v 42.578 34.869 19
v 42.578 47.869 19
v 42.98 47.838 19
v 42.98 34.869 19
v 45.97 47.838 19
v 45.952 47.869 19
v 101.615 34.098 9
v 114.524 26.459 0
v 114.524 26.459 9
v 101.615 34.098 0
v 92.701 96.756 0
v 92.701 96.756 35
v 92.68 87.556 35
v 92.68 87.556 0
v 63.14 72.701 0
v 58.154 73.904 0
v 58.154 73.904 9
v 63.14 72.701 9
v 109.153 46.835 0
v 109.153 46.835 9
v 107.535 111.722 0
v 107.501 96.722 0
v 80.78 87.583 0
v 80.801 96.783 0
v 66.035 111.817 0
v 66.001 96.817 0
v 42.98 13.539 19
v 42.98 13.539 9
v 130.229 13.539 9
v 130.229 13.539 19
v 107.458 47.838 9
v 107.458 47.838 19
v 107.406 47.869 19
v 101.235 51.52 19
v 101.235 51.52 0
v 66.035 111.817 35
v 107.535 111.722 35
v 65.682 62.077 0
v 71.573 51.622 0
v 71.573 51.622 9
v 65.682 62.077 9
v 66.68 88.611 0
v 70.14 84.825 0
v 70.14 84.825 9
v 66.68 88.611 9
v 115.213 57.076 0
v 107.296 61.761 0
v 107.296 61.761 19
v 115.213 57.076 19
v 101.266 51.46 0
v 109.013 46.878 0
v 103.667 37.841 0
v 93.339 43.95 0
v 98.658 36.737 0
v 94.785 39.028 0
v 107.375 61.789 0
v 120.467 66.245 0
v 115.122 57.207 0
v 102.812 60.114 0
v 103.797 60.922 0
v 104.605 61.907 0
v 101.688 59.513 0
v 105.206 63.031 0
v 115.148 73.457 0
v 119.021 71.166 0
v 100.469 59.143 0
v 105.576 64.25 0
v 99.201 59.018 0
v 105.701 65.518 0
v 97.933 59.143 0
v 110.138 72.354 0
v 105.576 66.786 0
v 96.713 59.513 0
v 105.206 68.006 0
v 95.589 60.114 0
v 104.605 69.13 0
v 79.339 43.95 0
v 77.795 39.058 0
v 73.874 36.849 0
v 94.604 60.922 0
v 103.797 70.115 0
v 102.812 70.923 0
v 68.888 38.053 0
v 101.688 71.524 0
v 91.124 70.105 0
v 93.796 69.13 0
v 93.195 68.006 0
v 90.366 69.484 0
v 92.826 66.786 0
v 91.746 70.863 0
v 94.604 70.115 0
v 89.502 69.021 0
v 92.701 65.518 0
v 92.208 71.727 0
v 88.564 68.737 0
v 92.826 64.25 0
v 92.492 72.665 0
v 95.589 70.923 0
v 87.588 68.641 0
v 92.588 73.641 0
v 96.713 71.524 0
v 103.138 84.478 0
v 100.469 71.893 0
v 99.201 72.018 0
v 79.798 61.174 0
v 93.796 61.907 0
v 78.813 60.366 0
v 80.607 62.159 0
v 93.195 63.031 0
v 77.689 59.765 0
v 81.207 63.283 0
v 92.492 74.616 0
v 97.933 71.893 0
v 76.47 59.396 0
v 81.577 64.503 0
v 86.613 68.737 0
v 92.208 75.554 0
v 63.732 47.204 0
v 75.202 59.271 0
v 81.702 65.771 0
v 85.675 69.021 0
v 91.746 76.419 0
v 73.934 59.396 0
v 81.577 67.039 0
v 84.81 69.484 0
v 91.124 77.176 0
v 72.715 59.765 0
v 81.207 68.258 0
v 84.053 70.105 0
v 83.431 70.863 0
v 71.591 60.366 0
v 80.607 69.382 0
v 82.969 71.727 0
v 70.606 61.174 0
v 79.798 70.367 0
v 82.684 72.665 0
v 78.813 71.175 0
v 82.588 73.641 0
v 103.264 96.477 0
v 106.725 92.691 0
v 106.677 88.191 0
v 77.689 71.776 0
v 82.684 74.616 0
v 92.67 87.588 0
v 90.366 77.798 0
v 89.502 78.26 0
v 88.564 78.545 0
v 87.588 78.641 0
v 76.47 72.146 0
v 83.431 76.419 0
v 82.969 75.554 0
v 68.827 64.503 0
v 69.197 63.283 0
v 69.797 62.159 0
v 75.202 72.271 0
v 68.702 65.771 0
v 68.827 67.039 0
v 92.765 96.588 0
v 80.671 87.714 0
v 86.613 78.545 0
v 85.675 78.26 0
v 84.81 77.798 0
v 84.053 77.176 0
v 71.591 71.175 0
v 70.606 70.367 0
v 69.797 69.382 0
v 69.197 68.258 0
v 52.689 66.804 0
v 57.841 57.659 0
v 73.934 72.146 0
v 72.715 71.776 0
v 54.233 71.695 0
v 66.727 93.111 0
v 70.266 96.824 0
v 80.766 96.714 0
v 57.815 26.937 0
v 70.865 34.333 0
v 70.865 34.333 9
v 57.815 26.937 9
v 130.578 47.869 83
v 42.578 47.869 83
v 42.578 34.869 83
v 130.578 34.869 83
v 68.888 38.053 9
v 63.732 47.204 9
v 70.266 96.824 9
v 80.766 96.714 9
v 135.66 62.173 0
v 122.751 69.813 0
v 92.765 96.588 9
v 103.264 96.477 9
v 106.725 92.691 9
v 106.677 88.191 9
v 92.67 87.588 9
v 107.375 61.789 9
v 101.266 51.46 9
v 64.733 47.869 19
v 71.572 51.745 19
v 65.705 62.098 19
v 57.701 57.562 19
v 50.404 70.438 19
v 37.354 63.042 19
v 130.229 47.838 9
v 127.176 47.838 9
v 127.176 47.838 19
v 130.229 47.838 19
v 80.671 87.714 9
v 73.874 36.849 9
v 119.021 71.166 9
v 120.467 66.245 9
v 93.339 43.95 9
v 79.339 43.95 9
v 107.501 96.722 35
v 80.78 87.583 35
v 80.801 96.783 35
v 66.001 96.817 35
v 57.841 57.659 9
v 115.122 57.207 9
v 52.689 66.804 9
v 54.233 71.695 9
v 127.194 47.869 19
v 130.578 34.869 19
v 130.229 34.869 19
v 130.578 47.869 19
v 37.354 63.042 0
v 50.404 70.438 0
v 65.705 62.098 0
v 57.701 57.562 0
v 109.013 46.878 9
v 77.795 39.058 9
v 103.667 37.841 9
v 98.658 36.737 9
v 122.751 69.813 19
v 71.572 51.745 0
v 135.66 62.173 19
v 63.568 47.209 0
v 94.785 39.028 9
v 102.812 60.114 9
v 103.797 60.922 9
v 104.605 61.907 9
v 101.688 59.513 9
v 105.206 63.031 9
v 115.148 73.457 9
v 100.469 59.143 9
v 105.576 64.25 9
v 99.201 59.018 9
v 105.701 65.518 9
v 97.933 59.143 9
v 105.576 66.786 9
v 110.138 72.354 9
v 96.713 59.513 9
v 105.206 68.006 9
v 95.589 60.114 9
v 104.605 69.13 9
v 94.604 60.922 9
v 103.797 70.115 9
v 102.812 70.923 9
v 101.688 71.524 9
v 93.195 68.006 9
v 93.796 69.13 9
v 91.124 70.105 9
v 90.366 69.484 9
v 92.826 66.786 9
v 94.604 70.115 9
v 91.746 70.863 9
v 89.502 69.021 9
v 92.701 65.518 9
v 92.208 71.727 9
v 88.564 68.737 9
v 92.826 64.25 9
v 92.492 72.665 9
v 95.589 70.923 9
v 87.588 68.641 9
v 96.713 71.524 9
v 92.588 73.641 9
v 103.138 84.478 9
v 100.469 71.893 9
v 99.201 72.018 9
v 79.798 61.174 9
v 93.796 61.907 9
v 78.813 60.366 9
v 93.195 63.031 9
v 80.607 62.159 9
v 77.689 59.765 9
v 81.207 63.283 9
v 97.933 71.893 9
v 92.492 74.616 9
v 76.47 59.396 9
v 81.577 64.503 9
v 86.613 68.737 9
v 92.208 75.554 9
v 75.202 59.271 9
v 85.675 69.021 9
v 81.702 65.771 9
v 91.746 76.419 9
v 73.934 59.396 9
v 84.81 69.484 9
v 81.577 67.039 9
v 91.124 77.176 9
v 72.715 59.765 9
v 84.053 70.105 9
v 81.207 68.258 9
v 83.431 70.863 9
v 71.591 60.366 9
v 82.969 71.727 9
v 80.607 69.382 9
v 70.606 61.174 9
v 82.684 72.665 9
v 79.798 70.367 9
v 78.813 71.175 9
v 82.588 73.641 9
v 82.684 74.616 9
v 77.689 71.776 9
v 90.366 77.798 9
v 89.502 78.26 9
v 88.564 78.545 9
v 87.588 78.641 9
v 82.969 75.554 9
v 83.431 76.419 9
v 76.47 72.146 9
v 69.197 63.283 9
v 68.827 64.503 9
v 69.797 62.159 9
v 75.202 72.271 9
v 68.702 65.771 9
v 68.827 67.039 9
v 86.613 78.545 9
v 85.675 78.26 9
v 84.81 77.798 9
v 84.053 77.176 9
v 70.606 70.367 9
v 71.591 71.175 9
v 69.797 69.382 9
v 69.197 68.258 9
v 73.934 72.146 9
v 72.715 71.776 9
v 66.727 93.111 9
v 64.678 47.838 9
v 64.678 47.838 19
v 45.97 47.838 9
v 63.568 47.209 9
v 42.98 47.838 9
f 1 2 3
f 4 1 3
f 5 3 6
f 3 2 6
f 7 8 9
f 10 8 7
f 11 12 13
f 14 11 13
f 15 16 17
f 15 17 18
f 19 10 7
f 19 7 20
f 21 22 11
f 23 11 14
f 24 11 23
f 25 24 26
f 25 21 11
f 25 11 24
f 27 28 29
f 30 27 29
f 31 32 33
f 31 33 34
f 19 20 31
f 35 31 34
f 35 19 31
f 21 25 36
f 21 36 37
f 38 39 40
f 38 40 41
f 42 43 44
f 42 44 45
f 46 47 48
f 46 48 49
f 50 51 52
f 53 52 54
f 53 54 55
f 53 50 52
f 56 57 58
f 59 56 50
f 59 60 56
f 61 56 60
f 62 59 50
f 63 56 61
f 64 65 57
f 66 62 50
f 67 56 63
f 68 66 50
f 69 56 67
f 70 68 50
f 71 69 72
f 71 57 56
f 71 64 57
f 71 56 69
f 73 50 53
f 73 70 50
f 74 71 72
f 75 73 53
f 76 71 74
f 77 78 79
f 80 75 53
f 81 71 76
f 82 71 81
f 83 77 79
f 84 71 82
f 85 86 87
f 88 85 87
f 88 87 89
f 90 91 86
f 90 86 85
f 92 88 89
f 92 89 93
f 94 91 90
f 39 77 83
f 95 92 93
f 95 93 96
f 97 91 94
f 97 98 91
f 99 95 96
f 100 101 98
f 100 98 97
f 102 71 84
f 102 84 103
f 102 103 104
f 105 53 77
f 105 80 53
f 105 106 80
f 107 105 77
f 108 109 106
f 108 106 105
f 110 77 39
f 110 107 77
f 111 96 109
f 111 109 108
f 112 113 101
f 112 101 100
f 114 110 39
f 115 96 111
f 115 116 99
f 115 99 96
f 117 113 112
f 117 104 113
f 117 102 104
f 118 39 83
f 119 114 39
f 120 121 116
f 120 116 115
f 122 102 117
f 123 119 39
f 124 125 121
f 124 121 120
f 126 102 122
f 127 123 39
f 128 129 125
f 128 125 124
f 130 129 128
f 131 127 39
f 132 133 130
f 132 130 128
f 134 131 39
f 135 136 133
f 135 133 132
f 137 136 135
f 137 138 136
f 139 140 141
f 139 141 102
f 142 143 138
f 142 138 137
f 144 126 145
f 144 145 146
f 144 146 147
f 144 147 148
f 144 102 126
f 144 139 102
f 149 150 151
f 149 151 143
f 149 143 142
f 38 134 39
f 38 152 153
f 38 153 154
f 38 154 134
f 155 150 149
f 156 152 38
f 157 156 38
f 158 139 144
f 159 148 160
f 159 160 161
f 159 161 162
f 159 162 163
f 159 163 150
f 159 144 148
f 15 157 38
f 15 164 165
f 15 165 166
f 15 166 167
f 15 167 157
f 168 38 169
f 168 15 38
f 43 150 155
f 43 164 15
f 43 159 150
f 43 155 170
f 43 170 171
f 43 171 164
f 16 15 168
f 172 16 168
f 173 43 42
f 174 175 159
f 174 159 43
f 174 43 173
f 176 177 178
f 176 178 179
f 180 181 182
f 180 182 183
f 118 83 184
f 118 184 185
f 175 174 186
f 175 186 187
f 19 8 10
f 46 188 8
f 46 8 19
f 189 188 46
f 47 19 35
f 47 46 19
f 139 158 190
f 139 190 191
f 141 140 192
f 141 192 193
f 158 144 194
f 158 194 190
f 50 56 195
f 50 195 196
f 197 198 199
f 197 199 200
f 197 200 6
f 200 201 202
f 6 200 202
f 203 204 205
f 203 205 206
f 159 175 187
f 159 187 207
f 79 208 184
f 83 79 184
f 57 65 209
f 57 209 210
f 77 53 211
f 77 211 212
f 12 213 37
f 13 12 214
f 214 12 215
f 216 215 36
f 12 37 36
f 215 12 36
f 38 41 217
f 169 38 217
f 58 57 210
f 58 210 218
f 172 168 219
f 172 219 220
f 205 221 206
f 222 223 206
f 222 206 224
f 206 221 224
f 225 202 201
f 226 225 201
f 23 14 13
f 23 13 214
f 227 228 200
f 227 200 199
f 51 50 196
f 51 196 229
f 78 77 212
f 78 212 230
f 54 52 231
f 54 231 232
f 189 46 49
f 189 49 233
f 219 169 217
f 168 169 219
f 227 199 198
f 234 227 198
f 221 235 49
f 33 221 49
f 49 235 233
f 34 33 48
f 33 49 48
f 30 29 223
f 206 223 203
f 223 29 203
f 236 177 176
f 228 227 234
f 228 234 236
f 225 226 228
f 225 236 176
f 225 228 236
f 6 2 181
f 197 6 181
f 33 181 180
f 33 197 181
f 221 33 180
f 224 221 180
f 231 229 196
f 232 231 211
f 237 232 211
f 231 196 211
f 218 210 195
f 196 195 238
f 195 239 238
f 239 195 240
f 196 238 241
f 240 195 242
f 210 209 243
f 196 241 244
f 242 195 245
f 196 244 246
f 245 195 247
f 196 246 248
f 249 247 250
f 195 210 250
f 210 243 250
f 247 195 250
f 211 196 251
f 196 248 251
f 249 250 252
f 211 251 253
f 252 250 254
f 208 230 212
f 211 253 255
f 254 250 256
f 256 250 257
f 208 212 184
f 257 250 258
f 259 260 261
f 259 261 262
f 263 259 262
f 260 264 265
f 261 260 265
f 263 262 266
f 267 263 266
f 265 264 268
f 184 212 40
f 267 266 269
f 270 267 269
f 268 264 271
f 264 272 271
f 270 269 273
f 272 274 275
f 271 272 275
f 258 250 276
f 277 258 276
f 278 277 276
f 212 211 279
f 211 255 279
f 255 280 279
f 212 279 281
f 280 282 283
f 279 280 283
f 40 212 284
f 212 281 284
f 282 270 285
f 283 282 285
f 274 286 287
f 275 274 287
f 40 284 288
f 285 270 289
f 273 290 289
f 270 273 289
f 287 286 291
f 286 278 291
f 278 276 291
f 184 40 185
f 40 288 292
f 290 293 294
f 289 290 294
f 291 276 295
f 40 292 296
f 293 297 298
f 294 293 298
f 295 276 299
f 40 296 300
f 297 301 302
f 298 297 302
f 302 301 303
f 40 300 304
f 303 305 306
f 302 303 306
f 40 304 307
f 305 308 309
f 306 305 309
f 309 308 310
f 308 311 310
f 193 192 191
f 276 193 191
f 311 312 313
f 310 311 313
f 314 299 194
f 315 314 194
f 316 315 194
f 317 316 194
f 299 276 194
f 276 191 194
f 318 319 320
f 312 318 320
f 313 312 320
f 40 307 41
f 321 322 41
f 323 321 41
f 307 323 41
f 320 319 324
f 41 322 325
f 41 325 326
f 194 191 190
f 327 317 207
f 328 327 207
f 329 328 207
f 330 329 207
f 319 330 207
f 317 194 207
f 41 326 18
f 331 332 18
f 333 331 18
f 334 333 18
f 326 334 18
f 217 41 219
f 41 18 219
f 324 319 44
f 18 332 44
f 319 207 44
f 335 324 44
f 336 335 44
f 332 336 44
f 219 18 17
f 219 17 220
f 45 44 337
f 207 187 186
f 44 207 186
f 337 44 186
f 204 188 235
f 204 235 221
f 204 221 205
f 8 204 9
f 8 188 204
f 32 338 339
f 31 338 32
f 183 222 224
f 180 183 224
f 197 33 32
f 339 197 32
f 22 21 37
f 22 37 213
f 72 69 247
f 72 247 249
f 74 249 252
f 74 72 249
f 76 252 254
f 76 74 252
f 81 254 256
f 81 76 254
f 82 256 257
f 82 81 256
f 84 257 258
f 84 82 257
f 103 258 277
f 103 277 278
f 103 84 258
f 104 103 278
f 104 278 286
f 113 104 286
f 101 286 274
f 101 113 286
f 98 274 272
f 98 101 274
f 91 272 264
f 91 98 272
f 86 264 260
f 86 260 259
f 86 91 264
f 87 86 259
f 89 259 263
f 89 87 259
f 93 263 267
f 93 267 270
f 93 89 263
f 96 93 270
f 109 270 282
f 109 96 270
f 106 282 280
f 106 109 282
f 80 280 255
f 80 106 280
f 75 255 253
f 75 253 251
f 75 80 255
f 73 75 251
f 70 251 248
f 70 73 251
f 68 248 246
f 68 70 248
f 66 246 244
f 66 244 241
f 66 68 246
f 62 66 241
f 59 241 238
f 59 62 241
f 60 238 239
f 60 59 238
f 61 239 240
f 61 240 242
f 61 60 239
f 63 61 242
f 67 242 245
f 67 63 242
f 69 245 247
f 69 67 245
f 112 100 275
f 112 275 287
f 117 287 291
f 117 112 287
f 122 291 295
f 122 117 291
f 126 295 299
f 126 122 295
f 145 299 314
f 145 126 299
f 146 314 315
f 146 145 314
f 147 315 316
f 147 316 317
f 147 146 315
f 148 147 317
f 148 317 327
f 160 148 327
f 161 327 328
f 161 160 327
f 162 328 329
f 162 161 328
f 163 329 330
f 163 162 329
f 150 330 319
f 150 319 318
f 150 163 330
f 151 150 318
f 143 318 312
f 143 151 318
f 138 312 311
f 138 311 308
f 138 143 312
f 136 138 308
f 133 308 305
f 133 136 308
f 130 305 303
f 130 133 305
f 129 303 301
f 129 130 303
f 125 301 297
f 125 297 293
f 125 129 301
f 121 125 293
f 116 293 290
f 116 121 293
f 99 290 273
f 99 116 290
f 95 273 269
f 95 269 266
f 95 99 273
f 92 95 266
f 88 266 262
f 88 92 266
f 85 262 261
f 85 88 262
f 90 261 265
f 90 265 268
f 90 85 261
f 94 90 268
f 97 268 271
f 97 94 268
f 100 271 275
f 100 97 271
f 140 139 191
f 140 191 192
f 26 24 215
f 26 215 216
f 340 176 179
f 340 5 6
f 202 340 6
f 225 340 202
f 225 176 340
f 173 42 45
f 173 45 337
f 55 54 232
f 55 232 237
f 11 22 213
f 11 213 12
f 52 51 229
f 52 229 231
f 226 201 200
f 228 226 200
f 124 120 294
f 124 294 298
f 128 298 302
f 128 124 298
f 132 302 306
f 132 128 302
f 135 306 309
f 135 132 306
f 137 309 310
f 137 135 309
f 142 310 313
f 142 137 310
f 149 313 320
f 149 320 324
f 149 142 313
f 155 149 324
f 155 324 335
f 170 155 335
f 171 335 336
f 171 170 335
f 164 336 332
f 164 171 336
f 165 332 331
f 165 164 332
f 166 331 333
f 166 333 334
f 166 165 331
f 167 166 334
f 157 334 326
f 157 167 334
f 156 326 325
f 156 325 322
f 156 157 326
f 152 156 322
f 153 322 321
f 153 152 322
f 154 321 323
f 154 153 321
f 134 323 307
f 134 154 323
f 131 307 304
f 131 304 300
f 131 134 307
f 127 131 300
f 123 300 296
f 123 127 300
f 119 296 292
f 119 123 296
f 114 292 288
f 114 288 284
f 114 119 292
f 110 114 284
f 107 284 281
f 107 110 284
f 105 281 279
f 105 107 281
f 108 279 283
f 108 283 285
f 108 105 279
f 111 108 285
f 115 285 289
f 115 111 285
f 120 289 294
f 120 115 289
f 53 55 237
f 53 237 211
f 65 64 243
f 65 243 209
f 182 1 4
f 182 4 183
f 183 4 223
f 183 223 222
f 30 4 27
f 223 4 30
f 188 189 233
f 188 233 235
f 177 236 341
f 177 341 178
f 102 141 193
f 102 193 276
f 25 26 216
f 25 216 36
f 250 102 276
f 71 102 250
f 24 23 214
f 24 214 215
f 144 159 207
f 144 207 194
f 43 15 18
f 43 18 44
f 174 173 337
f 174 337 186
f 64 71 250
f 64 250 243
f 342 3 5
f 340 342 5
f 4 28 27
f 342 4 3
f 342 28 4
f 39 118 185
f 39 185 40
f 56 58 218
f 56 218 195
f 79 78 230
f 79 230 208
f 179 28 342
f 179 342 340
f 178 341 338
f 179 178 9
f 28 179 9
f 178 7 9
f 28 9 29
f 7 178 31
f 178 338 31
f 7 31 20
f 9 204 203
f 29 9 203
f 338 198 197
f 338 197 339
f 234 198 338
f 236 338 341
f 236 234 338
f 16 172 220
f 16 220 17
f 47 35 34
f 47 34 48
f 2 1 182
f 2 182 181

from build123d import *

# Parameters (mm, degrees)
SKETCH001_R      = 5
SKETCH001_R_2    = 6.5
EXTRUDE_DEPTH    = 9
SKETCH004_W      = 87.248978
SKETCH004_H      = 34.299007
EXTRUDE004_DEPTH = 10
EXTRUDE002_DEPTH = 19
EXTRUDE001_DEPTH = 19
EXTRUDE003_DEPTH = 35
SKETCH005_W      = 88
SKETCH005_H      = 13
EXTRUDE005_DEPTH = 64


with BuildPart() as extrude_body:
    # Sketch001 → Extrude (new body)
    with BuildSketch(Plane(origin=(11, 13, 0), x_dir=(1, 0, 0), z_dir=(0, 0, 1))):
        Polygon((92.138212, 71.477997), (99.138212, 59.353641), (104.147683, 60.457133), (108.020931, 58.166292), (109.466872, 53.244732), (104.121576, 44.207154), (96.375081, 48.788836), (90.266171, 38.460176), (98.012666, 33.878494), (92.66737, 24.840916), (87.657898, 23.737425), (83.784651, 26.028266), (82.33871, 30.949826), (68.33871, 30.949826), (66.794519, 26.058201), (62.873968, 23.849291), (57.887594, 25.052863), (52.731628, 34.204082), (60.572729, 38.621903), (54.682302, 49.076704), (46.841201, 44.658884), (41.688919, 53.803566), (43.23311, 58.695191), (47.15366, 60.904101), (52.140035, 59.700529), (59.140035, 71.824885), (55.679647, 75.611469), (55.72695, 80.11122), (59.266176, 83.824222), (69.765596, 83.713849), (69.67099, 74.714346), (81.670327, 74.588205), (81.764933, 83.587708), (92.264353, 83.477334), (95.72474, 79.69075), (95.677437, 75.190999), align=None)
        with Locations((76.588238, 60.640856)):
            Circle(SKETCH001_R, mode=Mode.SUBTRACT)
        with Locations((64.201959, 52.770623)):
            Circle(SKETCH001_R_2, mode=Mode.SUBTRACT)
        with Locations((88.200633, 52.51834)):
            Circle(SKETCH001_R_2, mode=Mode.SUBTRACT)
    extrude(amount=EXTRUDE_DEPTH)


with BuildPart() as extrude004:
    # Sketch004 → Extrude004 (new body)
    with BuildSketch(Plane.XY):
        with Locations((83.604523, 30.688192)):
            Rectangle(SKETCH004_W, SKETCH004_H)
    extrude(amount=EXTRUDE004_DEPTH)


with BuildPart() as extrude004_1:
    # Extrude004 placement: moved
    add(extrude004.part.moved(Location((3, 0, 9))))


with BuildPart() as extrude002:
    # Sketch002 → Extrude002 (new body)
    with BuildSketch(Plane.XY):
        Polygon((114.524362, 26.458614), (101.615411, 34.09792), (109.152859, 46.834751), (101.23537, 51.520192), (107.295886, 61.761293), (115.213376, 57.075852), (122.750824, 69.812683), (135.659775, 62.173377), align=None)
    extrude(amount=EXTRUDE002_DEPTH)


with BuildPart() as extrude001:
    # Sketch → Extrude001 (new body)
    with BuildSketch(Plane.XY):
        Polygon((37.353531, 63.041878), (50.403561, 70.4376), (57.700674, 57.56157), (65.704692, 62.097613), (71.571965, 51.744589), (63.567946, 47.208546), (70.865059, 34.332516), (57.815029, 26.936794), align=None)
    extrude(amount=EXTRUDE001_DEPTH)


with BuildPart() as extrude003:
    # Sketch003 → Extrude003 (new body)
    with BuildSketch(Plane.XY):
        Polygon((107.534802, 111.722114), (107.500671, 96.722153), (92.700709, 96.755829), (92.679776, 87.555852), (80.779807, 87.582929), (80.80074, 96.782905), (66.000778, 96.816581), (66.034909, 111.816542), align=None)
    extrude(amount=EXTRUDE003_DEPTH)


with BuildPart() as suporteteste:
    # Sketch005 → Extrude005 (new body)
    with BuildSketch(Plane.XY):
        with Locations((83.577726, 41.368692)):
            Rectangle(SKETCH005_W, SKETCH005_H)
    extrude(amount=EXTRUDE005_DEPTH)


with BuildPart() as suporteteste_1:
    # Extrude005 placement: moved
    add(suporteteste.part.moved(Location((3, 0, 19))))

    # Fusion: union Extrude004, Extrude002, Extrude001, Extrude003
    add(extrude004_1.part)
    add(extrude002.part)
    add(extrude001.part)
    add(extrude003.part)


solid = Compound([extrude_body.part, suporteteste_1.part])
